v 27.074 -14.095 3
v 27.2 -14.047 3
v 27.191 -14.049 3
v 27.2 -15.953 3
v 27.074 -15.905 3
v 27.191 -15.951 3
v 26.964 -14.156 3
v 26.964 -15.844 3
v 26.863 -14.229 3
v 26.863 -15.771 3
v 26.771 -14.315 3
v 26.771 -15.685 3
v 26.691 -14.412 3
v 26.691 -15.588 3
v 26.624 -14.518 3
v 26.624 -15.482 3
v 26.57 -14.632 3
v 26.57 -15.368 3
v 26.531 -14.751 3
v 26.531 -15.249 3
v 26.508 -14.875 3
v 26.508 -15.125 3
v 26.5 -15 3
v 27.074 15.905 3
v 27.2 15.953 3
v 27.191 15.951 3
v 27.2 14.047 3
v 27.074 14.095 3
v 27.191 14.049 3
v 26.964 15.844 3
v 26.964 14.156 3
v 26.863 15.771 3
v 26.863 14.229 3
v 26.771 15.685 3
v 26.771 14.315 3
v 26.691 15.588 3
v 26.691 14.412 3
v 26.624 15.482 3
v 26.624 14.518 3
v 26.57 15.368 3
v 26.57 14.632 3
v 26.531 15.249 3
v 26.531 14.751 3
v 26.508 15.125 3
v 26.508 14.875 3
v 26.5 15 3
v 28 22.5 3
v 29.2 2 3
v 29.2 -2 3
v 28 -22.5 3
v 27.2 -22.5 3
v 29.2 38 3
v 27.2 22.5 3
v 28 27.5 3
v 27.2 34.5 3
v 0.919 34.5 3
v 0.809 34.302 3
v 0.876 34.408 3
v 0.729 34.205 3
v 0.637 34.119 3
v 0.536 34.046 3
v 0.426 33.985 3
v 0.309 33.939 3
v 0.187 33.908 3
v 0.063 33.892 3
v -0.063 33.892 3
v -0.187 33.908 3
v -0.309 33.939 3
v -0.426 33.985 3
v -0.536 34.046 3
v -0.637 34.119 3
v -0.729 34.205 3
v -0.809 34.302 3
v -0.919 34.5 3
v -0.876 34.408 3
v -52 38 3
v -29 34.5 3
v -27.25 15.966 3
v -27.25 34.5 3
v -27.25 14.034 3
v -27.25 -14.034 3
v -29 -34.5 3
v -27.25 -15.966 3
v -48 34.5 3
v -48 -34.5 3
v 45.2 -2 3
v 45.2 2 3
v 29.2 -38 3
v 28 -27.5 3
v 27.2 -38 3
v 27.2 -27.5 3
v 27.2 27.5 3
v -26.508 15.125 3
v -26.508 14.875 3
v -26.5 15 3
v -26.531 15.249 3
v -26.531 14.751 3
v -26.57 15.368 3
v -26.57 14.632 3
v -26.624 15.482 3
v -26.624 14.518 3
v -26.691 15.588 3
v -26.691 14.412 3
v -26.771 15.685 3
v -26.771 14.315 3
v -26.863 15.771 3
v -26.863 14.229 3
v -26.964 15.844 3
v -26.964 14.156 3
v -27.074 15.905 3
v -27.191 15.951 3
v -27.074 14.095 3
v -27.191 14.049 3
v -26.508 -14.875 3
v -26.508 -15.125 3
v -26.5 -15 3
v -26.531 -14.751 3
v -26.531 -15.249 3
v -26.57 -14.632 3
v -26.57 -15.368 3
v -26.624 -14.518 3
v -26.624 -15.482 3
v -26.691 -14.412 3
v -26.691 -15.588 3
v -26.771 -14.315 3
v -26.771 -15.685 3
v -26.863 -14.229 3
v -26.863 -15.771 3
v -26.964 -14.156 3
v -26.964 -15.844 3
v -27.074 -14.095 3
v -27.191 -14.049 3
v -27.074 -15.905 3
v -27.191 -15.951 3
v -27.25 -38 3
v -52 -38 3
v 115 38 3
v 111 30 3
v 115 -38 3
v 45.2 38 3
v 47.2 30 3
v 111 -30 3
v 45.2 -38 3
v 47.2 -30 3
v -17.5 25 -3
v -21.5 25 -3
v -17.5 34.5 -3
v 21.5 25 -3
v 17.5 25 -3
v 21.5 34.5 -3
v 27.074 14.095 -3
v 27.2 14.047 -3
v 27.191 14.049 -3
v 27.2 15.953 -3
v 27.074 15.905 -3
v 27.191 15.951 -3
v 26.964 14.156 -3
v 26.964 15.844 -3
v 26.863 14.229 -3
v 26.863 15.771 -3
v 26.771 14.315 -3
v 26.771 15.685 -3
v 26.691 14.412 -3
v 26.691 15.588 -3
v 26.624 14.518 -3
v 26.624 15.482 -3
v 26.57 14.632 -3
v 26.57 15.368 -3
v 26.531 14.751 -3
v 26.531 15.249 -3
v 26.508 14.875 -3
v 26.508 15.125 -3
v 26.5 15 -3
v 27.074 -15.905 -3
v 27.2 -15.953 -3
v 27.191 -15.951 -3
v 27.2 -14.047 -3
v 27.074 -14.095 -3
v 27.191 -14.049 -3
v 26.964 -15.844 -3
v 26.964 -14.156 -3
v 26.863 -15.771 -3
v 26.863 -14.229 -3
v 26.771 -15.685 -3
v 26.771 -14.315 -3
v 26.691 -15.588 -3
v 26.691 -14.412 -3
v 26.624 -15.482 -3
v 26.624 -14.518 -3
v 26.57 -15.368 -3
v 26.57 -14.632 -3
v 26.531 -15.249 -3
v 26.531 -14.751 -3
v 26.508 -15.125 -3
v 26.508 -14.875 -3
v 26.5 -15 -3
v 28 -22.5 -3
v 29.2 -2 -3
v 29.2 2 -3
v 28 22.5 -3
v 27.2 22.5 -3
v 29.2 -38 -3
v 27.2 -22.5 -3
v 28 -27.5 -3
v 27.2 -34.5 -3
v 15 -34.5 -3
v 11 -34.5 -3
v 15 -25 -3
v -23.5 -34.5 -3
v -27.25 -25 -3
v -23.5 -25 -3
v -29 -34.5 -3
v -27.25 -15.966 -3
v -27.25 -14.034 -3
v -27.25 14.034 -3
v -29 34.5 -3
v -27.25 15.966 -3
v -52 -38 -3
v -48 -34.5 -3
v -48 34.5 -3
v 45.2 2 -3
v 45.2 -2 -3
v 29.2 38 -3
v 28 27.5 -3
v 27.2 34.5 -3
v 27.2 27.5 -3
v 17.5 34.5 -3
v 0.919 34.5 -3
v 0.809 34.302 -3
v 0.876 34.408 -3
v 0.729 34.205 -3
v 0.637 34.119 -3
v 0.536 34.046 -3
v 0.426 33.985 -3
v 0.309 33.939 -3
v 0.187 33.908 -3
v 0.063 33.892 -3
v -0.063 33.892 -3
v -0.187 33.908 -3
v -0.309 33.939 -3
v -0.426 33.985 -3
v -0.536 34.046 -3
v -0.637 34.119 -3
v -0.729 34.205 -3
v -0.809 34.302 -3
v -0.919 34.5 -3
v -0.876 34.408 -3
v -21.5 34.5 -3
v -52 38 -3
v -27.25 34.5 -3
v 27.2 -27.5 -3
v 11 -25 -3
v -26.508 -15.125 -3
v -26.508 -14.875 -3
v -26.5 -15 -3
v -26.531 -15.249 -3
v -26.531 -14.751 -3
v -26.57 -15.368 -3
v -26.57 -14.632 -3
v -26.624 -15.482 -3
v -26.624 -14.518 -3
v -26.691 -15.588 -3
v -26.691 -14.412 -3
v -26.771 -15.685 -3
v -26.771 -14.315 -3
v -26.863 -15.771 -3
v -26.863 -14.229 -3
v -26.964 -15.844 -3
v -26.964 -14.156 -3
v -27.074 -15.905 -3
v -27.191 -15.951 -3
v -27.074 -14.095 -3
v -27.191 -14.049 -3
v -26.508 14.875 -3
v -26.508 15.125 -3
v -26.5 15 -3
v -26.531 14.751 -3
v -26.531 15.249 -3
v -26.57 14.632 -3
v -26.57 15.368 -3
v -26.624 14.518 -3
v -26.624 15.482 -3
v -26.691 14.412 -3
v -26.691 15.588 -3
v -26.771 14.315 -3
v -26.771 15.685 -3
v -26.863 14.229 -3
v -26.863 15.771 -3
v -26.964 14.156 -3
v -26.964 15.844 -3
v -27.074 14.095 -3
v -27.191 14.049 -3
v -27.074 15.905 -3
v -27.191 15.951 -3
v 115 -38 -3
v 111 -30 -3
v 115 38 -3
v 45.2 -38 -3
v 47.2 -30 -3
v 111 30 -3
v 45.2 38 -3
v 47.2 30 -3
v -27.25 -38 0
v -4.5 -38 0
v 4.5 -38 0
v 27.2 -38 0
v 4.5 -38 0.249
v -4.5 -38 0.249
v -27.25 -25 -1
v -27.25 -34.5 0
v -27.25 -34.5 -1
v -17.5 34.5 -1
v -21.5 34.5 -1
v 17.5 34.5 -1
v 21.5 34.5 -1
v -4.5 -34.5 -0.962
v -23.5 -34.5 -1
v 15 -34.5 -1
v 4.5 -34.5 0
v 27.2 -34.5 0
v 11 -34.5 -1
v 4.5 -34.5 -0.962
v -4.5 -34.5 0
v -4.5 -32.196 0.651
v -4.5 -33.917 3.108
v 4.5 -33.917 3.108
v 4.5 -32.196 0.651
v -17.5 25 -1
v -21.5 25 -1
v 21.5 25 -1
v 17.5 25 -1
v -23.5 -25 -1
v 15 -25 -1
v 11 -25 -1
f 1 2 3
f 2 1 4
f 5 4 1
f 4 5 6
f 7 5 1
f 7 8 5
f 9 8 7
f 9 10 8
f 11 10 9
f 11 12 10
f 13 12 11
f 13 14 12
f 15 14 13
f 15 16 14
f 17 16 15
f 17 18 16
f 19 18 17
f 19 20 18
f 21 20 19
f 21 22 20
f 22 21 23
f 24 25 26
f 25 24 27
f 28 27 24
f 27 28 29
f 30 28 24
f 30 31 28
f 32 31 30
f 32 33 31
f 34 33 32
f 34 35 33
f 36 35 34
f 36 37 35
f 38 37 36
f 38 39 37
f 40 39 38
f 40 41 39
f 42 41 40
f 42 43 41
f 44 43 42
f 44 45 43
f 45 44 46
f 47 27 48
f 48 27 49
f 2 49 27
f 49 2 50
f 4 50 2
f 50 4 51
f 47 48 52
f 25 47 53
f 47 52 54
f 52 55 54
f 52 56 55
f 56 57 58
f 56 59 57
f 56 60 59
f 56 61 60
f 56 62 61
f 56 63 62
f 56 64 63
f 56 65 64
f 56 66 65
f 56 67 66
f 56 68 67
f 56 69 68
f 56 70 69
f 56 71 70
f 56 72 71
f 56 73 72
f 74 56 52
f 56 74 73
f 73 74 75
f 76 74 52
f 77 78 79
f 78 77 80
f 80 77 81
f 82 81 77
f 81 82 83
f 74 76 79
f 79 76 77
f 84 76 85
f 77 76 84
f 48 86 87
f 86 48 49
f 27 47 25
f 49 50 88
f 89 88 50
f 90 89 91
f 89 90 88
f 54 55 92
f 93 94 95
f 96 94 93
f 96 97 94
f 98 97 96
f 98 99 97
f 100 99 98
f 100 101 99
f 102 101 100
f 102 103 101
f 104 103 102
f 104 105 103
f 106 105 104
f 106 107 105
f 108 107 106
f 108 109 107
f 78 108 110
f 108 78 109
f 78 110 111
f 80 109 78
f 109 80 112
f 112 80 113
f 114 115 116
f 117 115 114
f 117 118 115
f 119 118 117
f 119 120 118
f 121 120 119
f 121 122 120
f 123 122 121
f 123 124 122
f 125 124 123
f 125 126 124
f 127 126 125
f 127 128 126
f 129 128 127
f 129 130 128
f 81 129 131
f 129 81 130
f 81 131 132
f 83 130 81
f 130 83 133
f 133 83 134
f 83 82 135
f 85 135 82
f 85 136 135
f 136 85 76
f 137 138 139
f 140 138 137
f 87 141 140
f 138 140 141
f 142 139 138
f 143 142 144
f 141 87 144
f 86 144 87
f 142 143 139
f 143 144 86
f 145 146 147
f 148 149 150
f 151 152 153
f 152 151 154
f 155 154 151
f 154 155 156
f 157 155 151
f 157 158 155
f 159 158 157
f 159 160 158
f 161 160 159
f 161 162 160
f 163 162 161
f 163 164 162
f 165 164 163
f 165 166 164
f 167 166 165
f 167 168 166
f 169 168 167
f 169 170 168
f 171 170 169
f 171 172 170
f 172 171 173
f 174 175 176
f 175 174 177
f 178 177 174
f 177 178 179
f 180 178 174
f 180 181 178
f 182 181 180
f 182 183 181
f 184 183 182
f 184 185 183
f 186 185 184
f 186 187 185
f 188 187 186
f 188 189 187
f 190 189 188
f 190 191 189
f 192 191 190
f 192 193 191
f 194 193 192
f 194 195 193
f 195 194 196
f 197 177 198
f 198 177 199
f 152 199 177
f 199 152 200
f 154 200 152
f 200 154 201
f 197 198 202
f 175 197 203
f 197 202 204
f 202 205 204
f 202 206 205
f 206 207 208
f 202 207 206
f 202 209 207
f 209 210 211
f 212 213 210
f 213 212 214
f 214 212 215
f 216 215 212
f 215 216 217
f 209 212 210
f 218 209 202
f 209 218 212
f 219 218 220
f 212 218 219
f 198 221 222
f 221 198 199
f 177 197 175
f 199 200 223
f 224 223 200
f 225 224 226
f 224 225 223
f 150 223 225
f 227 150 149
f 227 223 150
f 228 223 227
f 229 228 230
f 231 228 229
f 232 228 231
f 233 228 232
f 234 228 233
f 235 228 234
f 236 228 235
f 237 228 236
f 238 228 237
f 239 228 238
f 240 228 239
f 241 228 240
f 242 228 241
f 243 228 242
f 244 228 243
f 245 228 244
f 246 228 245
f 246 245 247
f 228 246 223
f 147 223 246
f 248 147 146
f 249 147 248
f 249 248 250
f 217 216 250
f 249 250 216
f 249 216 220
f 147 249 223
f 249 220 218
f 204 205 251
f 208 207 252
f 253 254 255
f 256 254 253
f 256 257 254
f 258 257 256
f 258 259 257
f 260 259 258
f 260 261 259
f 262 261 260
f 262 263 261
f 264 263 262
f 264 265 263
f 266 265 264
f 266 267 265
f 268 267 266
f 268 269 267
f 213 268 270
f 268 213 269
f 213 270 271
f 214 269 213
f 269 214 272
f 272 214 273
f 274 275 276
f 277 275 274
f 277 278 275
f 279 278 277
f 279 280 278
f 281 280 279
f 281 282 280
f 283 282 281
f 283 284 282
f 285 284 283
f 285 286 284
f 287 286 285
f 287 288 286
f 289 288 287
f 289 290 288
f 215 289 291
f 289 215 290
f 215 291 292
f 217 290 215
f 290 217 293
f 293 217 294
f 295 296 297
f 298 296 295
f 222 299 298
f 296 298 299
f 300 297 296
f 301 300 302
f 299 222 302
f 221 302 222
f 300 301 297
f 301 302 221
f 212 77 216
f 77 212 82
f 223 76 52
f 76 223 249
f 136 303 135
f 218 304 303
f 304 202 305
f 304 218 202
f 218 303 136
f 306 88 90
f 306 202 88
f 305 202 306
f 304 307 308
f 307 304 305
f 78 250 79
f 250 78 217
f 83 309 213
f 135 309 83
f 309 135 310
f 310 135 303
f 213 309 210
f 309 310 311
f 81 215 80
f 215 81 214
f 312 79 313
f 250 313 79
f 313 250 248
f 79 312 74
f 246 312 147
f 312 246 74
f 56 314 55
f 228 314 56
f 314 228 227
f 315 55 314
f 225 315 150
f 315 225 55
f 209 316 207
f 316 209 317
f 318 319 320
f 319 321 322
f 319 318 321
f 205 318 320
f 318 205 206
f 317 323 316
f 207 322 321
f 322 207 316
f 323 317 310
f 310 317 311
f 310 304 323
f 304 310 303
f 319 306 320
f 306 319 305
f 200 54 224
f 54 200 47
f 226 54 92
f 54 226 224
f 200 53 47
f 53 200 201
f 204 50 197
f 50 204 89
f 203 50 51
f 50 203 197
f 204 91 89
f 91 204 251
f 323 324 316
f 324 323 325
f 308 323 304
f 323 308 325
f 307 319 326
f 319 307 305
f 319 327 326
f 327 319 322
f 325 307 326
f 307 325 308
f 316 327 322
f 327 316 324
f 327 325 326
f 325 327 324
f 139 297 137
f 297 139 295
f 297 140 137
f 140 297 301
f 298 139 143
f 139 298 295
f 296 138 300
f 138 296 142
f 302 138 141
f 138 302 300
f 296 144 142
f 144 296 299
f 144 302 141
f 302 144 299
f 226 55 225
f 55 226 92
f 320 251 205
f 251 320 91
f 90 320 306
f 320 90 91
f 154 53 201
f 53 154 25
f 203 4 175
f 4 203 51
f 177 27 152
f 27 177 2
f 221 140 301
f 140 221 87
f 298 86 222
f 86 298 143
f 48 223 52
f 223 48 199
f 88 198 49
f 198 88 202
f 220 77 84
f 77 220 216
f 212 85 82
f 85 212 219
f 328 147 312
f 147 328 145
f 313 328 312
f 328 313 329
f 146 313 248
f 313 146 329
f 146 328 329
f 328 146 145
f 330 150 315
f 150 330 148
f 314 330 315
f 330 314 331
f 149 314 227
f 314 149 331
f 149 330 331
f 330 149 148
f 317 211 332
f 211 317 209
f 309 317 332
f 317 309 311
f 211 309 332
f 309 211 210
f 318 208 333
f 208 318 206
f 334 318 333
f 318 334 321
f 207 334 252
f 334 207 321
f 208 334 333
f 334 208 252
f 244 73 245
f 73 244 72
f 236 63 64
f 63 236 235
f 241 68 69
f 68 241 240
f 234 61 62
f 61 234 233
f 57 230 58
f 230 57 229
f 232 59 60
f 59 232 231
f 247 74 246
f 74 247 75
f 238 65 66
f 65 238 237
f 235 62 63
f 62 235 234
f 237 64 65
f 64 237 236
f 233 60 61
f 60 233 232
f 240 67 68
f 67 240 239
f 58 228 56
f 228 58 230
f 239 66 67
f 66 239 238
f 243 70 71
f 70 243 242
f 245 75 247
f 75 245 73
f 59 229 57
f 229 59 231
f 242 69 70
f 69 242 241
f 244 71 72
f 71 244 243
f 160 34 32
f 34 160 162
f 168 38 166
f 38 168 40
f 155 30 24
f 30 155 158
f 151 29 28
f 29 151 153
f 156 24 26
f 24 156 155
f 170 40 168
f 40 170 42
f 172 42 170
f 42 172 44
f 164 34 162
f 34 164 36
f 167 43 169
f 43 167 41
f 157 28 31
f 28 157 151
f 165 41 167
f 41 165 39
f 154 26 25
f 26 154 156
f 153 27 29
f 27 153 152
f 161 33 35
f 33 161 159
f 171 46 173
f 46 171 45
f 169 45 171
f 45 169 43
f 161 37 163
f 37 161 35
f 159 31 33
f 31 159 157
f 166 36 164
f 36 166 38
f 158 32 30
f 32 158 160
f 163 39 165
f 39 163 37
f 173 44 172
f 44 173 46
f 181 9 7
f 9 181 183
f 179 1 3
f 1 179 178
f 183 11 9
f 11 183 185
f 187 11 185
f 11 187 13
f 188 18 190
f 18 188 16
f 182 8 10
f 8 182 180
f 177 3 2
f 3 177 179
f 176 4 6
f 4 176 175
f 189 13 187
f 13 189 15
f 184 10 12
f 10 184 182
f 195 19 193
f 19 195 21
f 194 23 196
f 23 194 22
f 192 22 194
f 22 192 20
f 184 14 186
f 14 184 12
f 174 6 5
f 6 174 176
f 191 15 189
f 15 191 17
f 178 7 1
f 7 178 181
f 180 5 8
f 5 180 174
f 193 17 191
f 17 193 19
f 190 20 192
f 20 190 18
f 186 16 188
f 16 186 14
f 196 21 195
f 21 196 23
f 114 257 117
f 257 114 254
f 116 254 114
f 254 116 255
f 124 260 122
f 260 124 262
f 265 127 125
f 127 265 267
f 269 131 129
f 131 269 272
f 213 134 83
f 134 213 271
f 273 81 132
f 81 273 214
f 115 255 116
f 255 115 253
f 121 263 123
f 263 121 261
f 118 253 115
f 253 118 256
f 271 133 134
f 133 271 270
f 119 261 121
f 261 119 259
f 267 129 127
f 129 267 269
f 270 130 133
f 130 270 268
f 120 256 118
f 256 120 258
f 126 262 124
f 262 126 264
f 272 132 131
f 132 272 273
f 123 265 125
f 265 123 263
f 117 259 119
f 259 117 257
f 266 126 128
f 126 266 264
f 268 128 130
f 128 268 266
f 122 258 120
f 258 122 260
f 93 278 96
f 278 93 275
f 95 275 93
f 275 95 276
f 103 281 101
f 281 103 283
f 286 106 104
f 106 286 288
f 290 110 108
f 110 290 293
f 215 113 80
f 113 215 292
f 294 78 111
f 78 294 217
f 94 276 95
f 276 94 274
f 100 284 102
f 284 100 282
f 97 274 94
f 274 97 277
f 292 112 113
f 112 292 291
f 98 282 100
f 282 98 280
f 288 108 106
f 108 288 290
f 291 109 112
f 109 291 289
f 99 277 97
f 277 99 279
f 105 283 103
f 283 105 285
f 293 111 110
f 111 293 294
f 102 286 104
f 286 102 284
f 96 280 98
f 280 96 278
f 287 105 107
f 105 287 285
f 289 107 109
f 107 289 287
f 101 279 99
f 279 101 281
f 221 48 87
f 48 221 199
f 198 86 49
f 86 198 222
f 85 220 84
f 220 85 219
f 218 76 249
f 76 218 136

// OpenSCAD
$fn = 50;
difference(){
	cube([58, 76, 6], center = true);
	translate([0, 0, 0]){
		cube([54.5, 69, 12], center = true);
	}
	translate([0, -36, 6]){
		cube([54.5, 6, 12], center = true);
	}
	translate([23, 25, 0]){
		cube([10, 5, 10], center = true);
	}
	translate([23, -25, 0]){
		cube([10, 5, 10], center = true);
	}
}

translate([-19.5, 30, -2]){
	cube([4, 10, 2], center = true);
}
translate([19.5, 30, -2]){
	cube([4, 10, 2], center = true);
}
translate([-25.5, -30, -2]){
	cube([4, 10, 2], center = true);
}
translate([13, -30, -2]){
	cube([4, 10, 2], center = true);
}
difference(){
	rotate([35,0,0]){
		translate([0, -29, 20.5]){
			cube([9, 6, 3], center = true);
		}
	}
	translate([0, -40.5, 0]){
		cube([10, 5, 10], center = true);
	}
}
translate([0, 34.89, 0]){
	cylinder(r = 1, h = 6, center = true);
}
translate([27.5, 15, 0]){
	cylinder(r = 1, h = 6, center = true);
}
translate([27.5, -15, 0]){
	cylinder(r = 1, h = 6, center = true);
}
translate([-27.5, -15, 0]){
	cylinder(r = 1, h = 6, center = true);
}
translate([-27.5, 15, 0]){
	cylinder(r = 1, h = 6, center = true);
}
translate([47,-38,-3]){
	difference(){
		cube([68,76,6]);
		translate([0,8,-2]){
			cube([64,60,10]);
		}
	}
}

translate([37.2,0,0]){
difference(){
	cube([20,76,6],center = true);
	translate([0,0,1.2]){
		cube([16,90,15],center = true);
	}
	translate([0,0,-3]){
		cube([16,40,20],center = true);
	}
	translate([-14.2, 25, 0]){
		cube([10, 5, 10], center = true);
	}
	translate([-14.2, -25, 0]){
		cube([10, 5, 10], center = true);
	}
}
}
translate([37,0,0]){
	cube([18,4,6],center = true);
}
translate([-40,33,0]){
	difference(){
	cube([22,10,6],center = true);
	translate([0,-3.5,0]){cube([28,10,10],center = true);}
	}
}
translate([-40,-33,0]){
	difference(){
	cube([22,10,6],center = true);
	translate([0,3.5,0]){cube([28,10,10],center = true);}
	}
}
translate([-50,0,0]){cube([4,76,6],center = true);}
